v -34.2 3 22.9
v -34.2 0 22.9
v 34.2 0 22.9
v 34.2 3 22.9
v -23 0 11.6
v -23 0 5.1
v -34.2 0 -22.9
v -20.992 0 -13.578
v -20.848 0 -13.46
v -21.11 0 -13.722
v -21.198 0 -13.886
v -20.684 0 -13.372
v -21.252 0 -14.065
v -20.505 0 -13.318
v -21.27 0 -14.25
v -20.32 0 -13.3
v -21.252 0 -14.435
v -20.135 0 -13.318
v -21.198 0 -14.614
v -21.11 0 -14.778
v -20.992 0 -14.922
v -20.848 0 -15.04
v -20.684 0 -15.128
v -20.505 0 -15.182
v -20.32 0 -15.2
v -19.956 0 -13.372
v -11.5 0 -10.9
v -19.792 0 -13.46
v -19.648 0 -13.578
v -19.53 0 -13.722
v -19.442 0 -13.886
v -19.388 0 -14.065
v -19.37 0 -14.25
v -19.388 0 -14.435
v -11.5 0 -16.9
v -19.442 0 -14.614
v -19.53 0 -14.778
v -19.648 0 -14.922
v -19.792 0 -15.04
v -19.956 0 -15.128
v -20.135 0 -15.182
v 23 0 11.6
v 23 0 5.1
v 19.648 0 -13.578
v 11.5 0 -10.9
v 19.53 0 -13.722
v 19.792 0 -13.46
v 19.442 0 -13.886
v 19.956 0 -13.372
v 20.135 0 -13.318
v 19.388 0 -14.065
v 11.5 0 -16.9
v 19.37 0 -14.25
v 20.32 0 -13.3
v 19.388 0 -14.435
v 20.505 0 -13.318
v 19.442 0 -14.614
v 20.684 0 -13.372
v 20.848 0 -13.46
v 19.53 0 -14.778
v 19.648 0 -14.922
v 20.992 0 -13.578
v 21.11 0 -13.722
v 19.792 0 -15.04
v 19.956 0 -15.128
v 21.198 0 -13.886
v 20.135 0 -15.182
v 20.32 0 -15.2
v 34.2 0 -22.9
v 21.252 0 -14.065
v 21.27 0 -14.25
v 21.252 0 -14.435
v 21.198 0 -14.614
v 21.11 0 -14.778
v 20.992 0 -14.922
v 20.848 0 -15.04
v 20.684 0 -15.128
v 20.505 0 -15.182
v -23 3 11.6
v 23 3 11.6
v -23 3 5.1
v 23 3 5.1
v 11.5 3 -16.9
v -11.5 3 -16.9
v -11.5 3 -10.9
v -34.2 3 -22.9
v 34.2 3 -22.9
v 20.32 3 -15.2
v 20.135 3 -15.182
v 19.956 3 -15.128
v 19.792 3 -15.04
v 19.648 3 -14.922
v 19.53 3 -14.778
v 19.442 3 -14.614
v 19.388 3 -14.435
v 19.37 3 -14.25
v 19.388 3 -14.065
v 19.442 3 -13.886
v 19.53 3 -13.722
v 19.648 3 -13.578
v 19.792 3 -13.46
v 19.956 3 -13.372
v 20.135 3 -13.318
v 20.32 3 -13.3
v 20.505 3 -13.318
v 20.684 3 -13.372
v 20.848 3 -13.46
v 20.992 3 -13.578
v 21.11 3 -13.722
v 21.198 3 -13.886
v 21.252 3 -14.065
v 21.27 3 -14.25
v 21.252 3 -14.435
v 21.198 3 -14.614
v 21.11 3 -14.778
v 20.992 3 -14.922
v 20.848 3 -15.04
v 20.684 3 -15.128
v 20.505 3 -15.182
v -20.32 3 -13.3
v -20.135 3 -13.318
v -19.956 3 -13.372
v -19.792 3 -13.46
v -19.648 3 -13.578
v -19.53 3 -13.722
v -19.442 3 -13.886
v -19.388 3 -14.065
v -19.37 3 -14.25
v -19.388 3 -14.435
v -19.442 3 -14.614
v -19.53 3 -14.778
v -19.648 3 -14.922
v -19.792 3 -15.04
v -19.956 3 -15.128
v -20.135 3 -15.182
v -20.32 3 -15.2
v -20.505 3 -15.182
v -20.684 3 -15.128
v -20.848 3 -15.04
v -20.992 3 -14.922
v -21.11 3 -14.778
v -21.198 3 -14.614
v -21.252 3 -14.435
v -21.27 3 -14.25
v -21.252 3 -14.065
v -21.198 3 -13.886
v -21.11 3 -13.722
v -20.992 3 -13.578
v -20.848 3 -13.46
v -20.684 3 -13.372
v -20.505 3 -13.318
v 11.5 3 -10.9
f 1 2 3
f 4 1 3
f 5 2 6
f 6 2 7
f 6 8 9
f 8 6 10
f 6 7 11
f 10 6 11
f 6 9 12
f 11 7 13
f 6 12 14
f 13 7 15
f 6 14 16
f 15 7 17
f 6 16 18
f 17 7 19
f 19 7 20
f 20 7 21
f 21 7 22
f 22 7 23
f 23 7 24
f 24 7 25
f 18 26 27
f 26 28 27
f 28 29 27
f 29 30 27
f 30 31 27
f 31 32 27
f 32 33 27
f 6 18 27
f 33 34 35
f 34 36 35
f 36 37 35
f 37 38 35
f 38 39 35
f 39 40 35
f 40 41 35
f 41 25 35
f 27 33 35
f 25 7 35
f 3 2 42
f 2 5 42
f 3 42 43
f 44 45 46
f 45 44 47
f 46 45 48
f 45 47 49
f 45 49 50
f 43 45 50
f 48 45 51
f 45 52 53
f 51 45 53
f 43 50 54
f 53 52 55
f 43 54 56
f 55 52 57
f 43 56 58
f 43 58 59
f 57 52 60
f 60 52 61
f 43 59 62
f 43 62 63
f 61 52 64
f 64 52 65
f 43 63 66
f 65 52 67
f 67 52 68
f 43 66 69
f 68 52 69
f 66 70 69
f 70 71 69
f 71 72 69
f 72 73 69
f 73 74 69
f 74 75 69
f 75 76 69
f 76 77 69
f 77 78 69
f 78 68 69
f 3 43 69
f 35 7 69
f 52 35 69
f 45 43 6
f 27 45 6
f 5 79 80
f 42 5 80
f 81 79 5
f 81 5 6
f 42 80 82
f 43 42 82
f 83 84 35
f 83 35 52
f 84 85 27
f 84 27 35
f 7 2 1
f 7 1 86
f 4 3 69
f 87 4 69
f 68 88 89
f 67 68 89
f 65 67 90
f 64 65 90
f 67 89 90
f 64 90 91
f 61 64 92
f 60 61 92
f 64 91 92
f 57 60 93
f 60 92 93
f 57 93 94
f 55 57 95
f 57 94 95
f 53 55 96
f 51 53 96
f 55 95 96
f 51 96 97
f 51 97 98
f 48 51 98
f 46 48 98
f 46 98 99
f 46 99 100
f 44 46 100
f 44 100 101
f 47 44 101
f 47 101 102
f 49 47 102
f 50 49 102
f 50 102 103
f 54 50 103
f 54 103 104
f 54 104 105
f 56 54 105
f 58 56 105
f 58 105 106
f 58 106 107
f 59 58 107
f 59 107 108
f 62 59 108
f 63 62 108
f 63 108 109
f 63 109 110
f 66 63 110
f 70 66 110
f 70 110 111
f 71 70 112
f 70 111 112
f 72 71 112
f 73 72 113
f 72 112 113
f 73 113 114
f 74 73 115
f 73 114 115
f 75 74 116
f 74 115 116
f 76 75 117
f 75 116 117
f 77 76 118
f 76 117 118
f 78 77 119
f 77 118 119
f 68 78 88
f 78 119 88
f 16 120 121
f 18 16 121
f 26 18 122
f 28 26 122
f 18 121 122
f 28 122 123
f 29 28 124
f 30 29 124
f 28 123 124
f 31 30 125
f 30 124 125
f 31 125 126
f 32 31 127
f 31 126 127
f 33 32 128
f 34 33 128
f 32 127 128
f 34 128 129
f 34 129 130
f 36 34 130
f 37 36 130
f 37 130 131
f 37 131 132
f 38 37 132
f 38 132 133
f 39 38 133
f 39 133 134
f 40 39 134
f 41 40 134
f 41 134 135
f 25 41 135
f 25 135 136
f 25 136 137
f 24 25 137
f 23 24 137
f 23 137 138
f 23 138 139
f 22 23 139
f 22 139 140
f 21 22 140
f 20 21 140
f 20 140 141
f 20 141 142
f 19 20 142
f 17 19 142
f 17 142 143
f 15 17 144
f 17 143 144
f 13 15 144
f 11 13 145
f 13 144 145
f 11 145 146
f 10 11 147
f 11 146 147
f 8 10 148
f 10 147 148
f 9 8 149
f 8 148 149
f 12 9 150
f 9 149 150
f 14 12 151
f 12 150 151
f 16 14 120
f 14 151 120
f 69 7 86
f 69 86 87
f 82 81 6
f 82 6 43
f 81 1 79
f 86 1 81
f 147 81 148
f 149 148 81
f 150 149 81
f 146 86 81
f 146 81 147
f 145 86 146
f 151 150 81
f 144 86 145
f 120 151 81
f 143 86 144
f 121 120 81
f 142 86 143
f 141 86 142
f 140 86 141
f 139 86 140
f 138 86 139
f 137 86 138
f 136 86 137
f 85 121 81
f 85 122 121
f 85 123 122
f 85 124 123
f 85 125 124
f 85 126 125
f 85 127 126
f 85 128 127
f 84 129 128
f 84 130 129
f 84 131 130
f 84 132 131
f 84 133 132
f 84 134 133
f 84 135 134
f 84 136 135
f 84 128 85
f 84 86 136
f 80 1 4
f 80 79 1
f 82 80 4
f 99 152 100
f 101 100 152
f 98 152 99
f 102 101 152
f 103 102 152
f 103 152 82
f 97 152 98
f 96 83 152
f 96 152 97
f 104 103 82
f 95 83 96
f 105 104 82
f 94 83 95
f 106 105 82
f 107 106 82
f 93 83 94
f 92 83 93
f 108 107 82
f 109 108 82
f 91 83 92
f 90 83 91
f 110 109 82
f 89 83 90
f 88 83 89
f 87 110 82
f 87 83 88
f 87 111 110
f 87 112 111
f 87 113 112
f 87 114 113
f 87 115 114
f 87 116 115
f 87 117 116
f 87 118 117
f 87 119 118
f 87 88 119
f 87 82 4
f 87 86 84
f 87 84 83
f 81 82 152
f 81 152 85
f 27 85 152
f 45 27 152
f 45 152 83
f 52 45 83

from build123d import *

# Parameters (mm, degrees)
SKETCH1_W           = 68.4
SKETCH1_H           = 45.8
BOSS_EXTRUDE1_DEPTH = 3
SKETCH2_R           = 0.95
CUT_EXTRUDE1_DEPTH  = 42.268026364
SKETCH3_W           = 23
SKETCH3_H           = 6
SKETCH3_W_2         = 46
SKETCH3_H_2         = 6.5
CUT_EXTRUDE2_DEPTH  = 42.268026364


with BuildPart() as part:
    # Sketch1 → Boss-Extrude1 (new body)
    with BuildSketch(Plane(origin=(0, 0, 0), x_dir=(1, 0, 0), z_dir=(0, 1, 0))):
        Rectangle(SKETCH1_W, SKETCH1_H)
    extrude(amount=BOSS_EXTRUDE1_DEPTH)

    # Sketch2 → Cut-Extrude1 (cut, through all)
    with BuildSketch(Plane(origin=(0, 3, 0), x_dir=(1, 0, 0), z_dir=(0, 1, 0))):
        with Locations(Location((-20.32, 14.25, 0), (0, 0, 270))):
            Circle(SKETCH2_R)
        with Locations(Location((20.32, 14.25, 0), (0, 0, 90))):
            Circle(SKETCH2_R)
    extrude(amount=-CUT_EXTRUDE1_DEPTH, mode=Mode.SUBTRACT)

    # Sketch3 → Cut-Extrude2 (cut, through all)
    with BuildSketch(Plane(origin=(0, 3, 0), x_dir=(1, 0, 0), z_dir=(0, 1, 0))):
        with Locations((0, 13.9)):
            Rectangle(SKETCH3_W, SKETCH3_H)
        with Locations((0, -8.35)):
            Rectangle(SKETCH3_W_2, SKETCH3_H_2)
    extrude(amount=-CUT_EXTRUDE2_DEPTH, mode=Mode.SUBTRACT)


solid = part.part
